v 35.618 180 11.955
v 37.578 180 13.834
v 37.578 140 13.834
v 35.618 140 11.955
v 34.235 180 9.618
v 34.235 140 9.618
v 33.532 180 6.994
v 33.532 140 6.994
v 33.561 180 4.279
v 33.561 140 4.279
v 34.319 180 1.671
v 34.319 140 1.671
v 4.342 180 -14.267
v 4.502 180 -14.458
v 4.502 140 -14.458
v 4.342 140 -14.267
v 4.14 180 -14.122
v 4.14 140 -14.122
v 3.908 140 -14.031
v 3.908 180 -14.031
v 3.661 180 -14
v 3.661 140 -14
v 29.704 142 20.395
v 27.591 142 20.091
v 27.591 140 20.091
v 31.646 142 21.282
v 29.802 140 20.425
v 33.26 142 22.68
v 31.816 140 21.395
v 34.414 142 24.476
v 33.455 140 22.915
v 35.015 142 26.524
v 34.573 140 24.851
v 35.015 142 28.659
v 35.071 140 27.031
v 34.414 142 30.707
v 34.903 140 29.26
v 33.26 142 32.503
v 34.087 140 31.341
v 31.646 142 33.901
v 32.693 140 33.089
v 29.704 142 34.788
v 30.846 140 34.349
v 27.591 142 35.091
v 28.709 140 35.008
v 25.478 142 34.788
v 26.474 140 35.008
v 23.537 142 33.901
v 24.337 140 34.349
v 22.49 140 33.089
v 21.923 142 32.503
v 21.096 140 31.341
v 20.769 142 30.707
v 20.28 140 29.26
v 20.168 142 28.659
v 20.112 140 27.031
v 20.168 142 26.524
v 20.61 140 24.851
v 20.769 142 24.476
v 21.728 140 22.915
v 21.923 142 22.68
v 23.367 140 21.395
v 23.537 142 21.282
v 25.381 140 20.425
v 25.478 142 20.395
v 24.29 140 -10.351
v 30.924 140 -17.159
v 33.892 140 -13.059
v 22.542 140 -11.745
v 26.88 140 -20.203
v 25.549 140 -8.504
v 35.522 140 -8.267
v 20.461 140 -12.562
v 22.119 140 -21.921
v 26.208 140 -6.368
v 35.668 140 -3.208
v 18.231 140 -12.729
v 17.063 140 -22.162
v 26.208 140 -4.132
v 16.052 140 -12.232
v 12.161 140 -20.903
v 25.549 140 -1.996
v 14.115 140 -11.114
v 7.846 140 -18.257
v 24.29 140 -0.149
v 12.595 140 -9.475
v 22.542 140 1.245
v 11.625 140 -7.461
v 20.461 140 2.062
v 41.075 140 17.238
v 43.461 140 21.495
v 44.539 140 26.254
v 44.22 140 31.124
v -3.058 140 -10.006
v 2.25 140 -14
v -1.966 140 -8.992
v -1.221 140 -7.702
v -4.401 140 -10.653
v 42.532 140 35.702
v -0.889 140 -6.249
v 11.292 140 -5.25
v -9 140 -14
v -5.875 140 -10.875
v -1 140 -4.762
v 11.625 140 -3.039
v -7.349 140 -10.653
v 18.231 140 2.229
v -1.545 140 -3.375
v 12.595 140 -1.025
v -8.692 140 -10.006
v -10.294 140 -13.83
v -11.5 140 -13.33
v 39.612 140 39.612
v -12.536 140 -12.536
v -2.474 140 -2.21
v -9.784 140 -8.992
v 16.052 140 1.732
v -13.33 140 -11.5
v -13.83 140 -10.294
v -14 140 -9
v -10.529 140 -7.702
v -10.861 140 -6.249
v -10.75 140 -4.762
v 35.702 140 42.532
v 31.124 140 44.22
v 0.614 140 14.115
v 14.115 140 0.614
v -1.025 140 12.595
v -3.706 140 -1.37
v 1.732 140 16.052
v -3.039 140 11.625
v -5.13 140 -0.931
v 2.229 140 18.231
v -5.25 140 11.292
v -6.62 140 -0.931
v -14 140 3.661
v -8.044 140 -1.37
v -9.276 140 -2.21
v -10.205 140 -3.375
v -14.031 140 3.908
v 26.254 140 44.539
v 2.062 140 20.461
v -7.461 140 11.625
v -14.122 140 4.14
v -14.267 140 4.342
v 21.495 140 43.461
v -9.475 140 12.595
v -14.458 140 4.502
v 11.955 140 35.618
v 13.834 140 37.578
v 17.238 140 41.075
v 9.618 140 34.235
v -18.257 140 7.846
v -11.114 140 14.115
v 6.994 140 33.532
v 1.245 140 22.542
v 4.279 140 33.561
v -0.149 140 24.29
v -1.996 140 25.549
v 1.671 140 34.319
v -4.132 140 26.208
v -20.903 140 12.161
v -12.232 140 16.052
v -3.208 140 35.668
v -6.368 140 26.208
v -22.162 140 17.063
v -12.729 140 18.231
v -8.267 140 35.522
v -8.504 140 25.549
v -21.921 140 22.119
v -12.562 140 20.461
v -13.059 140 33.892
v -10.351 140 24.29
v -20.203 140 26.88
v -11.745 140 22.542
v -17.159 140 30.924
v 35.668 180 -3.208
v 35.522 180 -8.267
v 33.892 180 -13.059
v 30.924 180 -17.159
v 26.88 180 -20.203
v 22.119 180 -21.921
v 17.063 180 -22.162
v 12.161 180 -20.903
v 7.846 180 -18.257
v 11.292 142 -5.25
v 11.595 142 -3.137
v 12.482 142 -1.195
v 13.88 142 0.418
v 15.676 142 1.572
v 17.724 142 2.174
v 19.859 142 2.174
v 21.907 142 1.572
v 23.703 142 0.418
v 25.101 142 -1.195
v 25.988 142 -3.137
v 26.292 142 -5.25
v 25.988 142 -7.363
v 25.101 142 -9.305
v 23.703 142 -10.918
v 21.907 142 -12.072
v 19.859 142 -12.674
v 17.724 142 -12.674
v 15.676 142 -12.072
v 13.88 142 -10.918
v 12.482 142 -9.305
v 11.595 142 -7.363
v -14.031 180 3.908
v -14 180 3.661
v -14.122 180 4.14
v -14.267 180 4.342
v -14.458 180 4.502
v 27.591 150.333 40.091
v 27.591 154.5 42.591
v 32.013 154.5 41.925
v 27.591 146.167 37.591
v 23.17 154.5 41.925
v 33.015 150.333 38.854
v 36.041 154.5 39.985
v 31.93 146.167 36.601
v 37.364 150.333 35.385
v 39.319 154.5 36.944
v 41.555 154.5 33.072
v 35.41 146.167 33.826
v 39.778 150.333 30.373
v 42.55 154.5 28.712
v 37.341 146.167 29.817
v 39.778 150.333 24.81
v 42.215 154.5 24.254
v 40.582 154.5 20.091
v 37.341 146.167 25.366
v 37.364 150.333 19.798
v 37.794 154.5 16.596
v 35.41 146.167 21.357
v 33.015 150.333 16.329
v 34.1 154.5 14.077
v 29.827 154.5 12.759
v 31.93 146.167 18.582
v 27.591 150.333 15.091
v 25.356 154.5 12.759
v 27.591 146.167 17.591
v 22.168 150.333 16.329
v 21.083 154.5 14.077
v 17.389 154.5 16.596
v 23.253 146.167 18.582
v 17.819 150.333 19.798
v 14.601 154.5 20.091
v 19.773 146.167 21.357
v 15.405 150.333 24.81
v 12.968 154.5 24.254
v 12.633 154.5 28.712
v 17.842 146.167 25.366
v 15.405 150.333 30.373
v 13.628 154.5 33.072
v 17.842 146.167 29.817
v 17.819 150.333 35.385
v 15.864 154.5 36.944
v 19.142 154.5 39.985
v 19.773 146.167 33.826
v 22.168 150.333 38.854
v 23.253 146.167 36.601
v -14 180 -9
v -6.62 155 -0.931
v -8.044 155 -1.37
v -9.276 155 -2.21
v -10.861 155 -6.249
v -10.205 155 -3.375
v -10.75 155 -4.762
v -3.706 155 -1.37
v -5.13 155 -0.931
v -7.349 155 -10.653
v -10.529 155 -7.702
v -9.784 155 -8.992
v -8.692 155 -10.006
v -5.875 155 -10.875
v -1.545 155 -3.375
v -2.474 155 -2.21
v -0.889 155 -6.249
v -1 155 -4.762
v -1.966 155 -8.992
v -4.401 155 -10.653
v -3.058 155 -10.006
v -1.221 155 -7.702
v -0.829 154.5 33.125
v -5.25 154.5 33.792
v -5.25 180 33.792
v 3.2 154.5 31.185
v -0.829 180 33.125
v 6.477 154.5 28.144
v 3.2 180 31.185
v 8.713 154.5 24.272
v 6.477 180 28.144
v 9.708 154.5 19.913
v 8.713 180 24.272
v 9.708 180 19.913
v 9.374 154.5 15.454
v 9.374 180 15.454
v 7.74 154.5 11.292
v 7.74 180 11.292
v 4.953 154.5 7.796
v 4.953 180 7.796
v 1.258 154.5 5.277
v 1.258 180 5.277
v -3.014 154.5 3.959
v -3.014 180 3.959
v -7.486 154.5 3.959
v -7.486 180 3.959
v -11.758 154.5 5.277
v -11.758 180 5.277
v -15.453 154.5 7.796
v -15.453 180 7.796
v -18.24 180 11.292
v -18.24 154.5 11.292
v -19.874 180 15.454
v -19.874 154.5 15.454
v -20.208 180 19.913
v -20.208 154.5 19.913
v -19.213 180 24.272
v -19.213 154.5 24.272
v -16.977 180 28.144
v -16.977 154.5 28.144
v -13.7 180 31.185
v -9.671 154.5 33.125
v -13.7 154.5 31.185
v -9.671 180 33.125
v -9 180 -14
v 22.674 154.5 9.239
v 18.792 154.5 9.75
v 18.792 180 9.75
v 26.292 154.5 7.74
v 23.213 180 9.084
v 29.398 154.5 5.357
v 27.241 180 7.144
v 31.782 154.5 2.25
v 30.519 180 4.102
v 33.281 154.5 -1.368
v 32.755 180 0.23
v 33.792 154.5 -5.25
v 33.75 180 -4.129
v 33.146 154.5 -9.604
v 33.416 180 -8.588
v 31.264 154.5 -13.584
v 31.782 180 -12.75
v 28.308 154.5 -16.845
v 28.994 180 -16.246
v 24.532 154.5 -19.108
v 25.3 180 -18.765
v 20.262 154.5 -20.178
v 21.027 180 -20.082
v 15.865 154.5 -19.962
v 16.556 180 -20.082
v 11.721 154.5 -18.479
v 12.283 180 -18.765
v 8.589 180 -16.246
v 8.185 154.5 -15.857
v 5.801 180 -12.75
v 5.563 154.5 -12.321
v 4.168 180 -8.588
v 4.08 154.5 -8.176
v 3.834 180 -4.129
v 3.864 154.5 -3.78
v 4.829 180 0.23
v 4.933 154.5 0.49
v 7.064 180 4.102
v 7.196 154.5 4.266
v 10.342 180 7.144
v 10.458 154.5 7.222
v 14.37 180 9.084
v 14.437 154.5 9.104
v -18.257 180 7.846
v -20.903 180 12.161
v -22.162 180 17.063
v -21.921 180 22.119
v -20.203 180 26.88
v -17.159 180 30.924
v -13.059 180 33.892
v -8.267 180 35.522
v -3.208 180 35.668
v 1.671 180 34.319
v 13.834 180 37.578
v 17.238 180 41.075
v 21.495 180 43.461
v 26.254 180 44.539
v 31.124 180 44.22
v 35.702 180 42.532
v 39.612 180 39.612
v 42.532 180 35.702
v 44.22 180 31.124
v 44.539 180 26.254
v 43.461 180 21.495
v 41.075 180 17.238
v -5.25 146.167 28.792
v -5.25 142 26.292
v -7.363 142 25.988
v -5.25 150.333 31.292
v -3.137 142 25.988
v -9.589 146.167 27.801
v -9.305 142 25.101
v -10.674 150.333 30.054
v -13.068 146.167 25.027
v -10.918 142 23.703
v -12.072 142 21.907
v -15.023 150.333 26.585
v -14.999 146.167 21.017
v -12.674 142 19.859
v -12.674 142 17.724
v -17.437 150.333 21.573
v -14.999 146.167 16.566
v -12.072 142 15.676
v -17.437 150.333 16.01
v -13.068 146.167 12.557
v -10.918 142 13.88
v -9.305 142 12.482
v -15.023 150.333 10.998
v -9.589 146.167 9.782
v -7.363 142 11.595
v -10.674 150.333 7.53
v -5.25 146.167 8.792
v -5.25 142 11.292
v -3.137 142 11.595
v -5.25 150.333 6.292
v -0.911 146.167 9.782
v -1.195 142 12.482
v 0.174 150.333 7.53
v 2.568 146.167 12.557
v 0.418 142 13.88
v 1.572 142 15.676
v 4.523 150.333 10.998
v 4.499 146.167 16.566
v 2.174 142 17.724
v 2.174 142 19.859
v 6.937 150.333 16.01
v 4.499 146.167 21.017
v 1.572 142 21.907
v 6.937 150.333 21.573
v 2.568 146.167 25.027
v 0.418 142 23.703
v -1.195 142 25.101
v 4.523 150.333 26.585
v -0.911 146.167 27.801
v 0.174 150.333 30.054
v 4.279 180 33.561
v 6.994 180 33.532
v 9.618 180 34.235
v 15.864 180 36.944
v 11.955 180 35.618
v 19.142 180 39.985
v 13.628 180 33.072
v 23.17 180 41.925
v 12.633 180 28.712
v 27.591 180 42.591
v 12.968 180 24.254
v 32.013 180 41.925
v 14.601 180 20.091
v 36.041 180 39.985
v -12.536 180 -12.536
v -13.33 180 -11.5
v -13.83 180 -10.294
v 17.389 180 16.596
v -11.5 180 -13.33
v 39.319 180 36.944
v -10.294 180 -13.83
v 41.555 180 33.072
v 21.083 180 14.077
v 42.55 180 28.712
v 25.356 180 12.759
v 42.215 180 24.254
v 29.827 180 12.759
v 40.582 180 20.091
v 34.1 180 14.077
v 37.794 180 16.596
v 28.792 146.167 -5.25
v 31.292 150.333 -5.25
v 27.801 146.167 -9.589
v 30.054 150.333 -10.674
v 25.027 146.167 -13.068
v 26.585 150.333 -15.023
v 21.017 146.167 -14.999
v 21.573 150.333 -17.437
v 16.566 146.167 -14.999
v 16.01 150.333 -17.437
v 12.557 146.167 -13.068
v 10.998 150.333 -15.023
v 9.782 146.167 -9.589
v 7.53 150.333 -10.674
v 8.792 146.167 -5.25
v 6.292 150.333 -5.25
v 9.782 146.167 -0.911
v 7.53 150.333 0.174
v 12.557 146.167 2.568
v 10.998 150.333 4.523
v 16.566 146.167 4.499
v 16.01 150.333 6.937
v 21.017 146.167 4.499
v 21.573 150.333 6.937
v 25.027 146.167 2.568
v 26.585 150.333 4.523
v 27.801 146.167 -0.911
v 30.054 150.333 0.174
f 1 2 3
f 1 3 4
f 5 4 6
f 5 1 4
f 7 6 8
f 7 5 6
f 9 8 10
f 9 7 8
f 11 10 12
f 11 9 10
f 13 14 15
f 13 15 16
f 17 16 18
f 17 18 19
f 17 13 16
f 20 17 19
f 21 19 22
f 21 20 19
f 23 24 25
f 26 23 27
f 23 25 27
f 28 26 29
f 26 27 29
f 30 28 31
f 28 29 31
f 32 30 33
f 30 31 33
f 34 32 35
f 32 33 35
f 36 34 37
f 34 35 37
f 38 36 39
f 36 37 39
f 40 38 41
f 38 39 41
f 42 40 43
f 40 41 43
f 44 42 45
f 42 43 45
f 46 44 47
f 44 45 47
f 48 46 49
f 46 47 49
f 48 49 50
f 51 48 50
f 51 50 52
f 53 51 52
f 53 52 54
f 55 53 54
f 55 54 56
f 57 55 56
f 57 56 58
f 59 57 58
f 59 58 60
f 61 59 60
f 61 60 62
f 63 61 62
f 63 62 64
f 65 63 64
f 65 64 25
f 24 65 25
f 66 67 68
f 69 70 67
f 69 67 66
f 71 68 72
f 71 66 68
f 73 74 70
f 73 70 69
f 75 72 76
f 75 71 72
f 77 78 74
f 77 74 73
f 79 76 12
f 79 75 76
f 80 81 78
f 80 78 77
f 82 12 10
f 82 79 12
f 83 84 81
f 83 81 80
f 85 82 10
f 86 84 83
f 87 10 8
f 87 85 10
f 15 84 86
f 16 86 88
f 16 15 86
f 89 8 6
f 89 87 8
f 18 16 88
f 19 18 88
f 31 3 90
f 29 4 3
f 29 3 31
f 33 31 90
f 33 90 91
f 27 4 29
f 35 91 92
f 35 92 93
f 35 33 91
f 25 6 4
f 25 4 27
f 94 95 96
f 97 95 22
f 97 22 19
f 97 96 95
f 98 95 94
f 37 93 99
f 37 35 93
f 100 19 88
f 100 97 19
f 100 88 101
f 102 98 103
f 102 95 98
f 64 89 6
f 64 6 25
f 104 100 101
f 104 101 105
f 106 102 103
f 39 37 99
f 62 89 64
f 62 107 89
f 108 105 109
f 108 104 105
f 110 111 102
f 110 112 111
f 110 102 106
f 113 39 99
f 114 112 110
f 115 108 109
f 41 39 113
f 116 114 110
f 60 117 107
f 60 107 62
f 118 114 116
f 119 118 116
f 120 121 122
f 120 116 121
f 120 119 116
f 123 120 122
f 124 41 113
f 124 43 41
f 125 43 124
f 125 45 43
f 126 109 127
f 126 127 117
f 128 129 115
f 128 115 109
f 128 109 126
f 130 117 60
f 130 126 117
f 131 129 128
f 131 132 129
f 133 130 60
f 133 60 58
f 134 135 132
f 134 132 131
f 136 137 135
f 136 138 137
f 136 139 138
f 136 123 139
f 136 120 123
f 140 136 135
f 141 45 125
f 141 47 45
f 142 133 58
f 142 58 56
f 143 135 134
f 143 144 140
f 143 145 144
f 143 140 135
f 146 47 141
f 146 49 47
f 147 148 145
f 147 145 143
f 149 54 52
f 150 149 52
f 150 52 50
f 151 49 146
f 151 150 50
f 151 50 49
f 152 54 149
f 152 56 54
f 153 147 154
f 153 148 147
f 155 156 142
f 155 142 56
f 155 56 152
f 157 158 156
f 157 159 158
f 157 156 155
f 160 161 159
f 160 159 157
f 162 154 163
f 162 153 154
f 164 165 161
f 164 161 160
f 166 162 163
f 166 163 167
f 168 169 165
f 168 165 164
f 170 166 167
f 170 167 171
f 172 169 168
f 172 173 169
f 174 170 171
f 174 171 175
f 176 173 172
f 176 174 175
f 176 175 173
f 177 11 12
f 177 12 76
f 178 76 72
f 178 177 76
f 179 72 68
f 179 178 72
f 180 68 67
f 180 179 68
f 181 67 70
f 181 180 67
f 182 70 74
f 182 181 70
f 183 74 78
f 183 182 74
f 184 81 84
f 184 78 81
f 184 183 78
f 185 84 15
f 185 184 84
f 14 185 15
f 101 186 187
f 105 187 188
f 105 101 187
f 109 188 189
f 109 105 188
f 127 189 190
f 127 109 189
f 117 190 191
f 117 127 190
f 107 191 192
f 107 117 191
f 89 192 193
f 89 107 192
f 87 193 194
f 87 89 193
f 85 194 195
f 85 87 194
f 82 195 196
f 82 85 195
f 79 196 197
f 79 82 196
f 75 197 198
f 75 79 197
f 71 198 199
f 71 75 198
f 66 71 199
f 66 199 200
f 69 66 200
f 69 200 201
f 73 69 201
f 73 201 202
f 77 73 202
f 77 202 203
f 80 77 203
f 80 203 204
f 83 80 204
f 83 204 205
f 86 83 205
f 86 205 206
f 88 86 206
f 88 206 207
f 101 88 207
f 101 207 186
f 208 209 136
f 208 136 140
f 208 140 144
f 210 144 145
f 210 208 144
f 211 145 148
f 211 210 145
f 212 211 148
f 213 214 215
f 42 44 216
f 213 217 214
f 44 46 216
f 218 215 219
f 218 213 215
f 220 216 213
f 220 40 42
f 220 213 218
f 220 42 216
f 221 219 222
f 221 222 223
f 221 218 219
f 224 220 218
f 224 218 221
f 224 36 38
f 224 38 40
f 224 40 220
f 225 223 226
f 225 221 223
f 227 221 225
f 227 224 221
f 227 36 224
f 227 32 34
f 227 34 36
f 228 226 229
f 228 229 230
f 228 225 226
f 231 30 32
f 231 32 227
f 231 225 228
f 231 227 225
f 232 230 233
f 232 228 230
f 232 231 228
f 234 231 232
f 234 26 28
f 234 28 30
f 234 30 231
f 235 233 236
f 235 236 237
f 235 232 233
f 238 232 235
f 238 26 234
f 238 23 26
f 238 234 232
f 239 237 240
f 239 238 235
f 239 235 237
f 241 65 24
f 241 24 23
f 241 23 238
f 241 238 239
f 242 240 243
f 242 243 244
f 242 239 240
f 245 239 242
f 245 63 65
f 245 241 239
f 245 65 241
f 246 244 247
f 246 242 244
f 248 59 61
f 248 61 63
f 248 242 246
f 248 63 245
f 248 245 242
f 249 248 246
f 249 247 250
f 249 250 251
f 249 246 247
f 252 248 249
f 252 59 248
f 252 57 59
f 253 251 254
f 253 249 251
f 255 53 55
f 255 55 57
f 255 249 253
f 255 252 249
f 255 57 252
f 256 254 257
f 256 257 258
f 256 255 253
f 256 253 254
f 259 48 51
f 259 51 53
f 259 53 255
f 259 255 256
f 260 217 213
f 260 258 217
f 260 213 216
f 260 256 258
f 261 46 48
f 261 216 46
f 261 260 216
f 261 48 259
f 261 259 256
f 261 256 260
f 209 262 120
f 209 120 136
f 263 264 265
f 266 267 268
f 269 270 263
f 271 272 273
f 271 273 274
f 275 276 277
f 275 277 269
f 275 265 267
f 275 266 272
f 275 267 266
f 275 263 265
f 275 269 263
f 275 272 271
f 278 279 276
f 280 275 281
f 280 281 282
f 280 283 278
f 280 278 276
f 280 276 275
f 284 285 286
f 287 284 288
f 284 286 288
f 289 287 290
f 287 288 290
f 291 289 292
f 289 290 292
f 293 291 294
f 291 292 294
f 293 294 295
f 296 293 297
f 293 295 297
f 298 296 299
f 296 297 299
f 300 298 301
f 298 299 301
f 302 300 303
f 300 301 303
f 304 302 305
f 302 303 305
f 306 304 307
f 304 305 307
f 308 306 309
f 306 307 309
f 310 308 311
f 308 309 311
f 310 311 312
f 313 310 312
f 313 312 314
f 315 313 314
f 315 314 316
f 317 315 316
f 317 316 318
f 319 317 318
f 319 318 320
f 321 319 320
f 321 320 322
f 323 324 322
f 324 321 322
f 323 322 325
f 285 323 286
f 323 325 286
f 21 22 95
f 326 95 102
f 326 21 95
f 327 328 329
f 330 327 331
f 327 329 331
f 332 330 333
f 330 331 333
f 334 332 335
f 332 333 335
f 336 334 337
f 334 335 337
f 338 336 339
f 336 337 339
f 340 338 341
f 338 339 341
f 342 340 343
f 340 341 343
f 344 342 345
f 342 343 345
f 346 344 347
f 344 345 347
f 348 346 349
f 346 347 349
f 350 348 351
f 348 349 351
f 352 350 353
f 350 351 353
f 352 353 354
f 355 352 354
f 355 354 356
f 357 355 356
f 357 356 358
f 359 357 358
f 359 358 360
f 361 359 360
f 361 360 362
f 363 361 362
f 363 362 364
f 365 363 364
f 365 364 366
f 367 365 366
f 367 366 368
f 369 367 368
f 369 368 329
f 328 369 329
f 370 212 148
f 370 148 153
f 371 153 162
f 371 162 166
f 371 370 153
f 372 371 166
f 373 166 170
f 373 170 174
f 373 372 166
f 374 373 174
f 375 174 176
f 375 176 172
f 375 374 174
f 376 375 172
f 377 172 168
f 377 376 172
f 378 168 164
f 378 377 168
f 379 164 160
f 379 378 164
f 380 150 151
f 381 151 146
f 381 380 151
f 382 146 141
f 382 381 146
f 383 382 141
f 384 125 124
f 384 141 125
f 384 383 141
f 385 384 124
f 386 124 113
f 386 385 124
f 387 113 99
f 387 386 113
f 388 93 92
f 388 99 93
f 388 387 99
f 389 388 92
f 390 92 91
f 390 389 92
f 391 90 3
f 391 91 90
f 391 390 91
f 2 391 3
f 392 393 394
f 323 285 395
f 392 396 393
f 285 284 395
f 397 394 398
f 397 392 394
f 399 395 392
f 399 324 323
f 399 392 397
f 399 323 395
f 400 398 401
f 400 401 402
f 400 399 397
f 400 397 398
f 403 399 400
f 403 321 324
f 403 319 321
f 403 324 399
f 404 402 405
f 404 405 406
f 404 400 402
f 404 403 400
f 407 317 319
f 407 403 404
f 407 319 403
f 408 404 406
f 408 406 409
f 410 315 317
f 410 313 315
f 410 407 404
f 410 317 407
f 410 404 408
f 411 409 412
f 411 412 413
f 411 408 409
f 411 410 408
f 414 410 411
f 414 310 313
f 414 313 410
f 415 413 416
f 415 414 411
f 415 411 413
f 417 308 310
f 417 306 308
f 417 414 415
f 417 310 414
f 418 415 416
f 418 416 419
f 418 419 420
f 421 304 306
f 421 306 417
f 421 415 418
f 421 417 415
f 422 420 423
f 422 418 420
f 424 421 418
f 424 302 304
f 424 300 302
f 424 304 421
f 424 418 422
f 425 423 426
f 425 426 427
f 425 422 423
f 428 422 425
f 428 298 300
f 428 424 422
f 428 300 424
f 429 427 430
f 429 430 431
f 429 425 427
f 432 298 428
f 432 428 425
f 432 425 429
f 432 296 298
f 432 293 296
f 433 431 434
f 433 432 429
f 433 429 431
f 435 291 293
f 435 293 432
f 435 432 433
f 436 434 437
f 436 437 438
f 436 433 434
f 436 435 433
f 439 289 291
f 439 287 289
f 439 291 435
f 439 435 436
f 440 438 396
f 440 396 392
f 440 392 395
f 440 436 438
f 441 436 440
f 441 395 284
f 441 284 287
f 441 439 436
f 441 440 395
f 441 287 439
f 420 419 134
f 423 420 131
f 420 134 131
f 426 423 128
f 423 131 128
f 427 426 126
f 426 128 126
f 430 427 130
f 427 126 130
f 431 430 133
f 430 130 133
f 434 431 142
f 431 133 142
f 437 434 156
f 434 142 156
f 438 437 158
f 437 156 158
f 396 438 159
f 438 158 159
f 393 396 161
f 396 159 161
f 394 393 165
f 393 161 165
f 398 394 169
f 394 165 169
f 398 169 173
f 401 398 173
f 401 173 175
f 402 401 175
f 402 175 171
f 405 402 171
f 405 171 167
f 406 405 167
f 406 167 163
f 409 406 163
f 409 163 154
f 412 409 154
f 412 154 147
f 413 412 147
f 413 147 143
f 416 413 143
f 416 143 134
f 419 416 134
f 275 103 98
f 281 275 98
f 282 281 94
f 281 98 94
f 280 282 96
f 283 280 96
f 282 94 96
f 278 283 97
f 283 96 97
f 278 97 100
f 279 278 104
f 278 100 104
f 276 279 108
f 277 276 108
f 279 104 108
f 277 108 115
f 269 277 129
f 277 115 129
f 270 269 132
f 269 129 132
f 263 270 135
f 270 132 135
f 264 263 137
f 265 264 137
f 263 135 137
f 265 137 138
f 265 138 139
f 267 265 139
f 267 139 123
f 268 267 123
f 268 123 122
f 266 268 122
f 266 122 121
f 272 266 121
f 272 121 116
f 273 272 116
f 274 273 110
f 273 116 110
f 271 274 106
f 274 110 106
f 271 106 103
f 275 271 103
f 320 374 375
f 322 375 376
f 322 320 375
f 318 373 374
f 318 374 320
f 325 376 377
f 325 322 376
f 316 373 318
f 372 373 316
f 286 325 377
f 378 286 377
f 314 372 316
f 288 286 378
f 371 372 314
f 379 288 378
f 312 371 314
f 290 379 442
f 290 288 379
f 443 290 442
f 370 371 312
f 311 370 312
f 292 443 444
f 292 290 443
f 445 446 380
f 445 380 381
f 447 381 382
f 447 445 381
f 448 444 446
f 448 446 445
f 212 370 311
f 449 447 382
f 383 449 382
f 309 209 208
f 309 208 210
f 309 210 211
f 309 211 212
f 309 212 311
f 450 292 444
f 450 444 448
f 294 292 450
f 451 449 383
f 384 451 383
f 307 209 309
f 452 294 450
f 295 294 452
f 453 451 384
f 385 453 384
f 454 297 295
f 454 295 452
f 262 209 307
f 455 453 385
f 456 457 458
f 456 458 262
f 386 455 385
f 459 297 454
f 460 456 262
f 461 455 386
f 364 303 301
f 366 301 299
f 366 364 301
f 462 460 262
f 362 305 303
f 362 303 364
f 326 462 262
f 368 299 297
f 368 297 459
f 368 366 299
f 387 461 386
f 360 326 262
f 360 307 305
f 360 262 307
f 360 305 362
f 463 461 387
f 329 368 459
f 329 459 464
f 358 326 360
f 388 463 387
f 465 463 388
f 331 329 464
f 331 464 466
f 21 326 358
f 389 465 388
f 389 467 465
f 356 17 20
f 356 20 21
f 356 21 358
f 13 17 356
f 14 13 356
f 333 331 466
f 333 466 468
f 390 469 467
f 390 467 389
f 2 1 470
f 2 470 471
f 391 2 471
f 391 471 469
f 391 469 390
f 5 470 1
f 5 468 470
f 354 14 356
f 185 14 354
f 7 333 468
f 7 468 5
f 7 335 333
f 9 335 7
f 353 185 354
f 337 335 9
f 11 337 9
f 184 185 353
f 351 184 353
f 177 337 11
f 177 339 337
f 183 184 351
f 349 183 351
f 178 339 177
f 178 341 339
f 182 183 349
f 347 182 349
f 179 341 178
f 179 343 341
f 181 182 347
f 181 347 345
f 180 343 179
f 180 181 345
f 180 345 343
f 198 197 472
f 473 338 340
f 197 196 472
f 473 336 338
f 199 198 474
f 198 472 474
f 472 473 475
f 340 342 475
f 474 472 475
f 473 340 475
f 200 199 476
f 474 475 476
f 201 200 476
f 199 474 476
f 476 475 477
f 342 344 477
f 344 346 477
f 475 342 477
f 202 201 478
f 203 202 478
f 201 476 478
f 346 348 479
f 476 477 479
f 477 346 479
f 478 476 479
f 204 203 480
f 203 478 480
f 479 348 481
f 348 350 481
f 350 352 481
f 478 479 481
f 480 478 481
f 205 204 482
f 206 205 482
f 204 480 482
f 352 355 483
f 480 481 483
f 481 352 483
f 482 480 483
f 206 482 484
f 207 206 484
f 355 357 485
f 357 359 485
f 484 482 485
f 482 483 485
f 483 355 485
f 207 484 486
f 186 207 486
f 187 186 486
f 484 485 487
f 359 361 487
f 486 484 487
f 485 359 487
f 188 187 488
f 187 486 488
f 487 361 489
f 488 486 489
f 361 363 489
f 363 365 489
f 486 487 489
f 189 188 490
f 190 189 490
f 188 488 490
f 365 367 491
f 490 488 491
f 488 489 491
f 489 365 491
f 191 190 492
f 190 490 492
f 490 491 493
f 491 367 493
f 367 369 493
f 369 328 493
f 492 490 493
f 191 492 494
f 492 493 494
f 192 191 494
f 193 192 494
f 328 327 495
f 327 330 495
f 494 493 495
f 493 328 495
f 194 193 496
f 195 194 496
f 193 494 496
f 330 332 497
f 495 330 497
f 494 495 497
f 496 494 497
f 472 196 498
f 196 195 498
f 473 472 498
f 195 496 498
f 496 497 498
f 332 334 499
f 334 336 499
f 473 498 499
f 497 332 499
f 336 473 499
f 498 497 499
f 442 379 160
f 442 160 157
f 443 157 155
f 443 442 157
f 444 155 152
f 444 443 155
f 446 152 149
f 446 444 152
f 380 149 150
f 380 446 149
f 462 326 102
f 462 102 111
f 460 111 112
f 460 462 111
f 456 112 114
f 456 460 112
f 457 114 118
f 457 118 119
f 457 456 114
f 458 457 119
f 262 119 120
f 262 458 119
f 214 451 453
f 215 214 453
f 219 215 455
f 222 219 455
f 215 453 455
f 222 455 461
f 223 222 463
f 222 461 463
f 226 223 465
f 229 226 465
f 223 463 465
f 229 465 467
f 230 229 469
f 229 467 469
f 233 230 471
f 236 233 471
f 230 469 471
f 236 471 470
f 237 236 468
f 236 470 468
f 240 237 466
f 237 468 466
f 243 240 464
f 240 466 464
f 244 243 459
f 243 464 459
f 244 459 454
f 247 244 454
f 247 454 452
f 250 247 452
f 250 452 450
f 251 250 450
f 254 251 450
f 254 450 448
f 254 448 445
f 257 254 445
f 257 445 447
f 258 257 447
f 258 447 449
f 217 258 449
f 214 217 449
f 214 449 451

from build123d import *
from build123d.topology import SkipClean

# Parameters (mm, degrees)
SKETCH1_W                = 30
SKETCH1_H                = 30
BOSS_EXTRUDE1_DEPTH      = 80
SKETCH2_R                = 6
BOSS_EXTRUDE2_DEPTH      = 22
CUT_EXTRUDE1_DEPTH       = 83.764726786
BOSS_EXTRUDE3_DEPTH      = 100
BOSS_EXTRUDE5_DEPTH      = 2
BOSS_EXTRUDE6_DEPTH      = 23
BOSS_EXTRUDE7_DEPTH      = 25
FILLET1_R                = 2
SKETCH11_R               = 6.055782361
CUT_EXTRUDE2_DEPTH       = 2.125
SKETCH12_W               = 13.25
SKETCH12_H               = 8.5
CUT_EXTRUDE4_DEPTH       = 13.25
CUT_EXTRUDE5_REACH       = 204.341
SKETCH15_W               = 3.75
SKETCH15_H               = 3.75
FILLET2_R                = 1
CUT_EXTRUDE7_START       = 22
SKETCH16_R               = 6
CUT_EXTRUDE7_DEPTH       = 22
SKETCH17_R               = 15
BOSS_EXTRUDE8_DEPTH      = 40
FILLET3_R                = 1
SKETCH18_R               = 15
SKETCH18_R_2             = 7.5
BOSS_EXTRUDE9_DEPTH      = 2
SKETCH22_R               = 209.016423622
CUT_EXTRUDE8_DEPTH       = 225.815151847
SKETCH23_W               = 22.070362909
SKETCH23_H               = 16.212180161
CUT_EXTRUDE9_DEPTH       = 65.514197169
SKETCH24_R               = 15
BOSS_EXTRUDE10_DEPTH     = 40
SKETCH25_R               = 15
SKETCH25_R_2             = 7.5
BOSS_EXTRUDE11_DEPTH     = 2
BOSS_EXTRUDE12_DEPTH     = 40
SKETCH29_R               = 2
CUT_EXTRUDE10_DEPTH      = 209.128716183
SKETCH30_R               = 3.025
CUT_EXTRUDE11_DEPTH      = 2.1
CUT_EXTRUDE12_DEPTH      = 111.386253673
CUT_EXTRUDE12_DEPTH_BACK = 111.386253673
SKETCH31_W               = 80
SKETCH31_H               = 80
BOSS_EXTRUDE13_DEPTH     = 190
CUT_EXTRUDE13_DEPTH      = 191.213565988
CUT_EXTRUDE13_DEPTH_BACK = 191.213565988
SKETCH33_W               = 75.892651359
SKETCH33_H               = 150.831877449
SKETCH36_R               = 5
CUT_EXTRUDE14_DEPTH      = 15


with BuildPart() as part:
    # Sketch1 → Boss-Extrude1 (new body)
    with BuildSketch(Plane(origin=(0, 0, 0), x_dir=(1, 0, 0), z_dir=(0, 1, 0))):
        Rectangle(SKETCH1_W, SKETCH1_H)
    extrude(amount=BOSS_EXTRUDE1_DEPTH)

    # Sketch2 → Boss-Extrude2 (add)
    with BuildSketch(Plane(origin=(0, 80, 0), x_dir=(1, 0, 0), z_dir=(0, 1, 0))):
        with Locations(Location((9, -9, 0), (0, 0, 270))):
            Circle(SKETCH2_R)
    extrude(amount=BOSS_EXTRUDE2_DEPTH)

    # Sketch3 → Cut-Extrude1 (cut, through all)
    with BuildSketch(Plane(origin=(0, 80, 0), x_dir=(1, 0, 0), z_dir=(0, 1, 0))):
        with BuildLine():
            Line((9, -15), (15, -15))
            Line((15, -15), (15, -9))
            ThreePointArc((15, -9), (13.242640687, -13.242640687), (9, -15))
        make_face()
    extrude(amount=-CUT_EXTRUDE1_DEPTH, mode=Mode.SUBTRACT)

    # Sketch4 → Boss-Extrude3 (add)
    with BuildSketch(Plane(origin=(0, 80, 0), x_dir=(1, 0, 0), z_dir=(0, 1, 0))):
        Polygon((-8.25, 11.25), (-8.25, 8.25), (-11.25, 8.25), (-15, 8.25), (-15, 11.25), (-11.25, 11.25), (-11.25, 15), (-8.25, 15), align=None)
        Polygon((-1.75, 1.75), (-11.25, 1.75), (-15, 1.75), (-15, -1.25), (-11.25, -1.25), (1.25, -1.25), (1.25, 11.25), (1.25, 15), (-1.75, 15), (-1.75, 11.25), align=None)
    extrude(amount=BOSS_EXTRUDE3_DEPTH)

    # Sketch6 → Boss-Extrude5 (add)
    with BuildSketch(Plane.XZ):
        with BuildLine():
            Line((15, -15), (7, -15))
            Line((7, -15), (7, -99.5))
            ThreePointArc((7, -99.5), (2.757359313, -109.742640687), (13, -105.5))
            Line((13, -105.5), (15, -105.5))
            Line((15, -105.5), (15, -15))
        make_face()
    extrude(amount=-BOSS_EXTRUDE5_DEPTH)

    # Sketch7 → Boss-Extrude6 (add)
    with SkipClean():  # the faces are left unmerged after this step: merging them gives an invalid solid
        with BuildSketch(Plane(origin=(0, 2, 0), x_dir=(1, 0, 0), z_dir=(0, 1, 0))):
            with BuildLine():
                Line((9, 111.156854249), (9, 108.964101615))
                ThreePointArc((9, 108.964101615), (7, 101.5), (5, 108.964101615))
                Line((5, 108.964101615), (5, 111.156854249))
                ThreePointArc((5, 111.156854249), (1.086408642, 104.485388128), (7, 99.5))
                Line((7, 99.5), (7, 15))
                Line((7, 15), (15, 15))
                Line((15, 15), (15, 105.5))
                Line((15, 105.5), (13, 105.5))
                ThreePointArc((13, 105.5), (11.898979486, 108.964101615), (9, 111.156854249))
            make_face()
        extrude(amount=BOSS_EXTRUDE6_DEPTH)

    # Sketch9 → Boss-Extrude7 (add)
    with SkipClean():  # the faces are left unmerged after this step: merging them gives an invalid solid
        with BuildSketch(Plane.XZ):
            with BuildLine():
                Line((-15, 15), (-15, 7))
                Line((-15, 7), (-126.175, 7))
                ThreePointArc((-126.175, 7), (-126.252697751, 6.037536458), (-126.48377869, 5.1))
                Line((-126.48377869, 5.1), (-128.797778509, 5.1))
                ThreePointArc((-128.797778509, 5.1), (-136.05, 7), (-128.797778509, 8.9))
                Line((-128.797778509, 8.9), (-126.3, 8.9))
                ThreePointArc((-126.3, 8.9), (-128.491885554, 11.955834237), (-132.050001601, 13.173329766))
                Line((-132.050001601, 13.173329766), (-132.050001601, 15))
                Line((-132.050001601, 15), (-15, 15))
            make_face()
        extrude(amount=-BOSS_EXTRUDE7_DEPTH)

    # Fillet1
    fillet1_edges = [part.edges().sort_by_distance(p)[0] for p in [
        (-126.175, 12.5, 7),
    ]]
    fillet(fillet1_edges, radius=FILLET1_R)

    # Sketch11 → Cut-Extrude2 (cut)
    with SkipClean():  # the faces are left unmerged after this step: merging them gives an invalid solid
        with BuildSketch(Plane.XZ):
            with Locations((-132.175, 7)):
                Circle(SKETCH11_R)
        extrude(amount=-CUT_EXTRUDE2_DEPTH, mode=Mode.SUBTRACT)

    # Sketch12 → Cut-Extrude4 (cut)
    with SkipClean():  # the faces are left unmerged after this step: merging them gives an invalid solid
        with BuildSketch(Plane.ZY.offset(15)):
            with Locations((-8.375, 72.75)):
                Rectangle(SKETCH12_W, SKETCH12_H)
        extrude(amount=-CUT_EXTRUDE4_DEPTH, mode=Mode.SUBTRACT)

    # Sketch15 → Cut-Extrude5 (cut, up to next)
    with BuildSketch(Plane(origin=(0, 80, 0), x_dir=(1, 0, 0), z_dir=(0, 1, 0)), mode=Mode.PRIVATE) as cut_extrude5_sk1:
        with Locations((-13.125, 13.125)):
            Rectangle(SKETCH15_W, SKETCH15_H)
    cut_extrude5_tool1 = extrude(cut_extrude5_sk1.sketch, amount=-CUT_EXTRUDE5_REACH, mode=Mode.PRIVATE) & part.part
    add(cut_extrude5_tool1.solids().sort_by_distance((-13.125, 80, -13.125))[0], mode=Mode.SUBTRACT)

    # Fillet2
    fillet2_edges = [part.edges().sort_by_distance(p)[0] for p in [
        (-11.25, 130, -15),
        (-11.25, 130, -11.25),
        (-15, 130, -11.25),
        (-15, 130, 1.25),
        (1.25, 130, -15),
    ]]
    fillet(fillet2_edges, radius=FILLET2_R)

    # Sketch16 → Cut-Extrude7 (cut)
    with SkipClean():  # the faces are left unmerged after this step: merging them gives an invalid solid
        with BuildSketch(Plane(origin=(0, 80, 0), x_dir=(1, 0, 0), z_dir=(0, 1, 0)).offset(CUT_EXTRUDE7_START)):
            with Locations((9, -9)):
                Circle(SKETCH16_R)
        extrude(amount=-CUT_EXTRUDE7_DEPTH, mode=Mode.SUBTRACT)


with BuildPart() as cut_extrude7_kept_piece:
    # of the separate pieces the step leaves, the one the design keeps (cut_extrude7_pieces_kept)
    add(part.part.solids().sort_by_distance((-15, 80, 0.25))[0])

    # Sketch17 → Boss-Extrude8 (add)
    with SkipClean():  # the faces are left unmerged after this step: merging them gives an invalid solid
        with BuildSketch(Plane(origin=(0, 180, 0), x_dir=(1, 0, 0), z_dir=(0, 1, 0))):
            with BuildLine():
                Line((-14, -1.25), (-14, -4.216394713))
                ThreePointArc((-14, -4.216394713), (-14.384018227, -33.129332993), (11.657578086, -20.561885701))
                ThreePointArc((11.657578086, -20.561885701), (14.532144442, -14.532144442), (20.561885701, -11.657578086))
                ThreePointArc((20.561885701, -11.657578086), (33.129332993, 14.384018227), (4.216394713, 14))
                Line((4.216394713, 14), (1.25, 14))
                Line((1.25, 14), (1.25, -1.25))
                Line((1.25, -1.25), (-14, -1.25))
            make_face()
            with Locations(Location((18.79163056, 5.25, 0), (0, 0, 270))):
                Circle(SKETCH17_R, mode=Mode.SUBTRACT)
            with Locations(Location((-5.25, -18.79163056, 0), (0, 0, 270))):
                Circle(SKETCH17_R, mode=Mode.SUBTRACT)
        extrude(amount=-BOSS_EXTRUDE8_DEPTH)

    # Fillet3
    # the kernel refuses this fillet: 1 mm, written as the material it adds along each edge
    with BuildSketch(Plane(origin=(-14, 140, 1.25), x_dir=(-0.9659258262890684, 0, -0.25881904510252046), z_dir=(0, 1, 0))) as fillet3_piece_1:
        with BuildLine():
            CenterArc((0.776457135, 0.965925826), FILLET3_R, 195, 60)
            Line((-0.189468691, 0.707106781), (0, 0))
            ThreePointArc((0, 0), (0.258819045, 0.034074174), (0.51763809, 0))
        make_face()
    extrude(amount=40)
    with BuildSketch(Plane(origin=(-14, 180, 4.216394713), x_dir=(0, 0, -1), z_dir=(0, -1, 0))) as fillet3_piece_2:
        with BuildLine():
            CenterArc((0.555444904, -1), FILLET3_R, 90, 57.202831704)
            ThreePointArc((-0.285148471, -0.458333333), (-0.140754957, -0.230298516), (0, 0))
            Line((0, 0), (0.555444904, 0))
        make_face()
    extrude(amount=40)
    with BuildSketch(Plane(origin=(1.25, 140, -14), x_dir=(-0.2588190451025201, 0, -0.9659258262890685), z_dir=(0, 1, 0))) as fillet3_piece_3:
        with BuildLine():
            CenterArc((0.776457135, -0.965925826), FILLET3_R, 105, 60)
            Line((-0.189468691, -0.707106781), (0, 0))
            ThreePointArc((0, 0), (0.258819045, -0.034074174), (0.51763809, 0))
        make_face()
    extrude(amount=40)
    with BuildSketch(Plane(origin=(4.216394713, 180, -14), x_dir=(-1, 0, 0), z_dir=(0, -1, 0))) as fillet3_piece_4:
        with BuildLine():
            CenterArc((0.555444904, 1), FILLET3_R, 212.797168296, 57.202831704)
            ThreePointArc((-0.285148471, 0.458333333), (-0.140754957, 0.230298516), (0, 0))
            Line((0, 0), (0.555444904, 0))
        make_face()
    extrude(amount=40)

    # Sketch18 → Boss-Extrude9 (add)
    with SkipClean():  # the faces are left unmerged after this step: merging them gives an invalid solid
        with BuildSketch(Plane.XZ.offset(-140)):
            with Locations(Location((-5.25, 18.79163056, 0), (0, 0, 90))):
                Circle(SKETCH18_R)
            with Locations(Location((-5.25, 18.79163056, 0), (0, 0, 270))):
                Circle(SKETCH18_R_2, mode=Mode.SUBTRACT)
        boss_extrude9 = extrude(amount=-BOSS_EXTRUDE9_DEPTH)

    # Sketch21 → Revolve1 (revolve)
    with SkipClean():  # the faces are left unmerged after this step: merging them gives an invalid solid
        with BuildSketch(Plane(origin=(-5.25, 0, 0), x_dir=(0, 0, -1), z_dir=(-1, 0, 0)), mode=Mode.PRIVATE) as revolve1_sk:
            Polygon((-11.29163056, -142), (-3.79163056, -154.5), (-3.79163056, -142), align=None)
        revolve1 = revolve(revolve1_sk.sketch.rotate(Axis((-5.25, 1065, 18.79163056), (0, -1, 0)), 180), axis=Axis((-5.25, 1065, 18.79163056), (0, -1, 0)))

    # Mirror1: Boss-Extrude9, Revolve1 across plane
    with SkipClean():  # the faces are left unmerged after this step: merging them gives an invalid solid
        add(boss_extrude9.mirror(Plane(origin=(0, 0, 0), x_dir=(0.7071067811865478, 0, 0.7071067811865472), z_dir=(0.7071067811865475, 0, -0.7071067811865477))))
        add(revolve1.mirror(Plane(origin=(0, 0, 0), x_dir=(0.7071067811865478, 0, 0.7071067811865472), z_dir=(0.7071067811865475, 0, -0.7071067811865477))))

    # Sketch22 → Cut-Extrude8 (cut, through all)
    with BuildSketch(Plane.XZ.offset(-140)):
        Circle(SKETCH22_R)
    extrude(amount=CUT_EXTRUDE8_DEPTH, mode=Mode.SUBTRACT)


with BuildPart() as cut_extrude8_piece_1:
    # of the separate pieces the step leaves, piece 1, a body of its own (cut_extrude8_pieces)
    add(cut_extrude7_kept_piece.part.solids().sort_by_distance((4.501543184, 180, -14.458333333))[0])

    # Sketch24 → Boss-Extrude10 (add)
    with BuildSketch(Plane(origin=(0, 180, 0), x_dir=(1, 0, 0), z_dir=(0, 1, 0))):
        with BuildLine():
            ThreePointArc((13.834213525, -37.57835306), (39.612293374, -39.612293374), (37.57835306, -13.834213525))
            ThreePointArc((37.57835306, -13.834213525), (33.79372713, -8.329895406), (34.31915027, -1.67070312))
            ThreePointArc((34.31915027, -1.67070312), (28.778505526, -8.507264569), (20.561885701, -11.657578086))
            ThreePointArc((20.561885701, -11.657578086), (14.532144442, -14.532144442), (11.657578086, -20.561885701))
            ThreePointArc((11.657578086, -20.561885701), (8.507264569, -28.778505526), (1.67070312, -34.31915027))
            ThreePointArc((1.67070312, -34.31915027), (8.329895406, -33.79372713), (13.834213525, -37.57835306))
        make_face()
        with Locations(Location((27.591478094, -27.591478094, 0), (0, 0, 270))):
            Circle(SKETCH24_R, mode=Mode.SUBTRACT)
    extrude(amount=-BOSS_EXTRUDE10_DEPTH)

    # Sketch25 → Boss-Extrude11 (add)
    with BuildSketch(Plane.XZ.offset(-140)):
        with Locations(Location((27.591478094, 27.591478094, 0), (0, 0, 90))):
            Circle(SKETCH25_R)
        with Locations(Location((27.591478094, 27.591478094, 0), (0, 0, 270))):
            Circle(SKETCH25_R_2, mode=Mode.SUBTRACT)
    extrude(amount=-BOSS_EXTRUDE11_DEPTH)

    # Sketch26 → Revolve2 (revolve)
    with BuildSketch(Plane(origin=(0, 0, 0), x_dir=(-0.7071067811865476, 0, -0.7071067811865475), z_dir=(0.7071067811865475, 0, -0.7071067811865476)), mode=Mode.PRIVATE) as revolve2_sk:
        Polygon((-24.020242526, 142), (-24.020242526, 154.5), (-31.520242526, 142), align=None)
    revolve(revolve2_sk.sketch.rotate(Axis((27.591478094, 126.995387654, 27.591478094), (0, 1, 0)), 135), axis=Axis((27.591478094, 126.995387654, 27.591478094), (0, 1, 0)))

    # Sketch27 → Boss-Extrude12 (add)
    with BuildSketch(Plane(origin=(0, 180, 0), x_dir=(1, 0, 0), z_dir=(0, 1, 0))):
        Polygon((2.25, -2.25), (2.25, 72.75), (-1.75, 72.75), (-1.75, 1.75), (-72.75, 1.75), (-72.75, -2.25), align=None)
    extrude(amount=-BOSS_EXTRUDE12_DEPTH)

    # Sketch29 → Cut-Extrude10 (cut, through all)
    with BuildSketch(Plane.XY.offset(2.25)):
        with Locations((-24, 144)):
            Circle(SKETCH29_R)
        with Locations((-24, 176)):
            Circle(SKETCH29_R)
        with Locations((-68.75, 144)):
            Circle(SKETCH29_R)
        with Locations((-68.75, 176)):
            Circle(SKETCH29_R)
    cut_extrude10 = extrude(amount=-CUT_EXTRUDE10_DEPTH, mode=Mode.SUBTRACT)

    # Sketch30 → Cut-Extrude11 (cut)
    with BuildSketch(Plane(origin=(0, 0, -1.75), x_dir=(-1, 0, 0), z_dir=(0, 0, -1))):
        with Locations((14.135, 148)):
            Circle(SKETCH30_R)
        with Locations((29.545, 148)):
            Circle(SKETCH30_R)
        with Locations((44.955, 148)):
            Circle(SKETCH30_R)
        with Locations((60.365, 148)):
            Circle(SKETCH30_R)
        with Locations(Location((60.365, 172, 0), (0, 0, 180))):
            Circle(SKETCH30_R)
        with Locations(Location((44.955, 172, 0), (0, 0, 180))):
            Circle(SKETCH30_R)
        with Locations(Location((29.545, 172, 0), (0, 0, 180))):
            Circle(SKETCH30_R)
        with Locations(Location((14.135, 172, 0), (0, 0, 180))):
            Circle(SKETCH30_R)
    cut_extrude11 = extrude(amount=-CUT_EXTRUDE11_DEPTH, mode=Mode.SUBTRACT)

    # Mirror2: Cut-Extrude10, Cut-Extrude11 across plane
    add(cut_extrude10.mirror(Plane(origin=(0, 0, 0), x_dir=(0.7071067811865476, 0, 0.7071067811865475), z_dir=(0.7071067811865475, 0, -0.7071067811865476))), mode=Mode.SUBTRACT)
    add(cut_extrude11.mirror(Plane(origin=(0, 0, 0), x_dir=(0.7071067811865476, 0, 0.7071067811865475), z_dir=(0.7071067811865475, 0, -0.7071067811865476))), mode=Mode.SUBTRACT)

    # Sketch31 → Cut-Extrude12 (cut, two sides: drawn at the far end of the back side and taken through both)
    with BuildSketch(Plane(origin=(0, 180, 0), x_dir=(1, 0, 0), z_dir=(0, 1, 0)).offset(-CUT_EXTRUDE12_DEPTH_BACK)):
        with Locations((-37.75, 37.75)):
            Rectangle(SKETCH31_W, SKETCH31_H)
    extrude(amount=CUT_EXTRUDE12_DEPTH + CUT_EXTRUDE12_DEPTH_BACK, mode=Mode.SUBTRACT)

    # Sketch32 → Boss-Extrude13 (add)
    with BuildSketch(Plane(origin=(0, 180, 0), x_dir=(1, 0, 0), z_dir=(0, 1, 0))):
        with BuildLine():
            Line((-14, -2.25), (2.25, -2.25))
            Line((2.25, -2.25), (2.25, 14))
            Line((2.25, 14), (-9, 14))
            ThreePointArc((-9, 14), (-12.535533906, 12.535533906), (-14, 9))
            Line((-14, 9), (-14, -2.25))
        make_face()
    extrude(amount=-BOSS_EXTRUDE13_DEPTH)

    # Sketch33 → Cut-Extrude13 (cut, two sides: drawn at the far end of the back side and taken through both)
    with BuildSketch(Plane.XY.offset(2.25).offset(-CUT_EXTRUDE13_DEPTH_BACK)):
        with Locations((-20.864349969, 64.584061276)):
            Rectangle(SKETCH33_W, SKETCH33_H)
    extrude(amount=CUT_EXTRUDE13_DEPTH + CUT_EXTRUDE13_DEPTH_BACK, mode=Mode.SUBTRACT)

    # Sketch36 → Cut-Extrude14 (cut)
    with BuildSketch(Plane.XZ.offset(-140)):
        with Locations(Location((-5.875, -5.875, 0), (0, 0, 270))):
            Circle(SKETCH36_R)
    extrude(amount=-CUT_EXTRUDE14_DEPTH, mode=Mode.SUBTRACT)


with BuildPart() as cut_extrude8_piece_2:
    # of the separate pieces the step leaves, piece 2, a body of its own (cut_extrude8_pieces)
    add(cut_extrude7_kept_piece.part.solids().sort_by_distance((-10.25, 140, -15))[0])

    # Sketch23 → Cut-Extrude9 (cut, through all)
    with BuildSketch(Plane(origin=(0, 180, 0), x_dir=(1, 0, 0), z_dir=(0, 1, 0))):
        with Locations((-15.719387653, 13.178118111)):
            Rectangle(SKETCH23_W, SKETCH23_H)
    extrude(amount=-CUT_EXTRUDE9_DEPTH, mode=Mode.SUBTRACT)


solid = cut_extrude8_piece_1.part
